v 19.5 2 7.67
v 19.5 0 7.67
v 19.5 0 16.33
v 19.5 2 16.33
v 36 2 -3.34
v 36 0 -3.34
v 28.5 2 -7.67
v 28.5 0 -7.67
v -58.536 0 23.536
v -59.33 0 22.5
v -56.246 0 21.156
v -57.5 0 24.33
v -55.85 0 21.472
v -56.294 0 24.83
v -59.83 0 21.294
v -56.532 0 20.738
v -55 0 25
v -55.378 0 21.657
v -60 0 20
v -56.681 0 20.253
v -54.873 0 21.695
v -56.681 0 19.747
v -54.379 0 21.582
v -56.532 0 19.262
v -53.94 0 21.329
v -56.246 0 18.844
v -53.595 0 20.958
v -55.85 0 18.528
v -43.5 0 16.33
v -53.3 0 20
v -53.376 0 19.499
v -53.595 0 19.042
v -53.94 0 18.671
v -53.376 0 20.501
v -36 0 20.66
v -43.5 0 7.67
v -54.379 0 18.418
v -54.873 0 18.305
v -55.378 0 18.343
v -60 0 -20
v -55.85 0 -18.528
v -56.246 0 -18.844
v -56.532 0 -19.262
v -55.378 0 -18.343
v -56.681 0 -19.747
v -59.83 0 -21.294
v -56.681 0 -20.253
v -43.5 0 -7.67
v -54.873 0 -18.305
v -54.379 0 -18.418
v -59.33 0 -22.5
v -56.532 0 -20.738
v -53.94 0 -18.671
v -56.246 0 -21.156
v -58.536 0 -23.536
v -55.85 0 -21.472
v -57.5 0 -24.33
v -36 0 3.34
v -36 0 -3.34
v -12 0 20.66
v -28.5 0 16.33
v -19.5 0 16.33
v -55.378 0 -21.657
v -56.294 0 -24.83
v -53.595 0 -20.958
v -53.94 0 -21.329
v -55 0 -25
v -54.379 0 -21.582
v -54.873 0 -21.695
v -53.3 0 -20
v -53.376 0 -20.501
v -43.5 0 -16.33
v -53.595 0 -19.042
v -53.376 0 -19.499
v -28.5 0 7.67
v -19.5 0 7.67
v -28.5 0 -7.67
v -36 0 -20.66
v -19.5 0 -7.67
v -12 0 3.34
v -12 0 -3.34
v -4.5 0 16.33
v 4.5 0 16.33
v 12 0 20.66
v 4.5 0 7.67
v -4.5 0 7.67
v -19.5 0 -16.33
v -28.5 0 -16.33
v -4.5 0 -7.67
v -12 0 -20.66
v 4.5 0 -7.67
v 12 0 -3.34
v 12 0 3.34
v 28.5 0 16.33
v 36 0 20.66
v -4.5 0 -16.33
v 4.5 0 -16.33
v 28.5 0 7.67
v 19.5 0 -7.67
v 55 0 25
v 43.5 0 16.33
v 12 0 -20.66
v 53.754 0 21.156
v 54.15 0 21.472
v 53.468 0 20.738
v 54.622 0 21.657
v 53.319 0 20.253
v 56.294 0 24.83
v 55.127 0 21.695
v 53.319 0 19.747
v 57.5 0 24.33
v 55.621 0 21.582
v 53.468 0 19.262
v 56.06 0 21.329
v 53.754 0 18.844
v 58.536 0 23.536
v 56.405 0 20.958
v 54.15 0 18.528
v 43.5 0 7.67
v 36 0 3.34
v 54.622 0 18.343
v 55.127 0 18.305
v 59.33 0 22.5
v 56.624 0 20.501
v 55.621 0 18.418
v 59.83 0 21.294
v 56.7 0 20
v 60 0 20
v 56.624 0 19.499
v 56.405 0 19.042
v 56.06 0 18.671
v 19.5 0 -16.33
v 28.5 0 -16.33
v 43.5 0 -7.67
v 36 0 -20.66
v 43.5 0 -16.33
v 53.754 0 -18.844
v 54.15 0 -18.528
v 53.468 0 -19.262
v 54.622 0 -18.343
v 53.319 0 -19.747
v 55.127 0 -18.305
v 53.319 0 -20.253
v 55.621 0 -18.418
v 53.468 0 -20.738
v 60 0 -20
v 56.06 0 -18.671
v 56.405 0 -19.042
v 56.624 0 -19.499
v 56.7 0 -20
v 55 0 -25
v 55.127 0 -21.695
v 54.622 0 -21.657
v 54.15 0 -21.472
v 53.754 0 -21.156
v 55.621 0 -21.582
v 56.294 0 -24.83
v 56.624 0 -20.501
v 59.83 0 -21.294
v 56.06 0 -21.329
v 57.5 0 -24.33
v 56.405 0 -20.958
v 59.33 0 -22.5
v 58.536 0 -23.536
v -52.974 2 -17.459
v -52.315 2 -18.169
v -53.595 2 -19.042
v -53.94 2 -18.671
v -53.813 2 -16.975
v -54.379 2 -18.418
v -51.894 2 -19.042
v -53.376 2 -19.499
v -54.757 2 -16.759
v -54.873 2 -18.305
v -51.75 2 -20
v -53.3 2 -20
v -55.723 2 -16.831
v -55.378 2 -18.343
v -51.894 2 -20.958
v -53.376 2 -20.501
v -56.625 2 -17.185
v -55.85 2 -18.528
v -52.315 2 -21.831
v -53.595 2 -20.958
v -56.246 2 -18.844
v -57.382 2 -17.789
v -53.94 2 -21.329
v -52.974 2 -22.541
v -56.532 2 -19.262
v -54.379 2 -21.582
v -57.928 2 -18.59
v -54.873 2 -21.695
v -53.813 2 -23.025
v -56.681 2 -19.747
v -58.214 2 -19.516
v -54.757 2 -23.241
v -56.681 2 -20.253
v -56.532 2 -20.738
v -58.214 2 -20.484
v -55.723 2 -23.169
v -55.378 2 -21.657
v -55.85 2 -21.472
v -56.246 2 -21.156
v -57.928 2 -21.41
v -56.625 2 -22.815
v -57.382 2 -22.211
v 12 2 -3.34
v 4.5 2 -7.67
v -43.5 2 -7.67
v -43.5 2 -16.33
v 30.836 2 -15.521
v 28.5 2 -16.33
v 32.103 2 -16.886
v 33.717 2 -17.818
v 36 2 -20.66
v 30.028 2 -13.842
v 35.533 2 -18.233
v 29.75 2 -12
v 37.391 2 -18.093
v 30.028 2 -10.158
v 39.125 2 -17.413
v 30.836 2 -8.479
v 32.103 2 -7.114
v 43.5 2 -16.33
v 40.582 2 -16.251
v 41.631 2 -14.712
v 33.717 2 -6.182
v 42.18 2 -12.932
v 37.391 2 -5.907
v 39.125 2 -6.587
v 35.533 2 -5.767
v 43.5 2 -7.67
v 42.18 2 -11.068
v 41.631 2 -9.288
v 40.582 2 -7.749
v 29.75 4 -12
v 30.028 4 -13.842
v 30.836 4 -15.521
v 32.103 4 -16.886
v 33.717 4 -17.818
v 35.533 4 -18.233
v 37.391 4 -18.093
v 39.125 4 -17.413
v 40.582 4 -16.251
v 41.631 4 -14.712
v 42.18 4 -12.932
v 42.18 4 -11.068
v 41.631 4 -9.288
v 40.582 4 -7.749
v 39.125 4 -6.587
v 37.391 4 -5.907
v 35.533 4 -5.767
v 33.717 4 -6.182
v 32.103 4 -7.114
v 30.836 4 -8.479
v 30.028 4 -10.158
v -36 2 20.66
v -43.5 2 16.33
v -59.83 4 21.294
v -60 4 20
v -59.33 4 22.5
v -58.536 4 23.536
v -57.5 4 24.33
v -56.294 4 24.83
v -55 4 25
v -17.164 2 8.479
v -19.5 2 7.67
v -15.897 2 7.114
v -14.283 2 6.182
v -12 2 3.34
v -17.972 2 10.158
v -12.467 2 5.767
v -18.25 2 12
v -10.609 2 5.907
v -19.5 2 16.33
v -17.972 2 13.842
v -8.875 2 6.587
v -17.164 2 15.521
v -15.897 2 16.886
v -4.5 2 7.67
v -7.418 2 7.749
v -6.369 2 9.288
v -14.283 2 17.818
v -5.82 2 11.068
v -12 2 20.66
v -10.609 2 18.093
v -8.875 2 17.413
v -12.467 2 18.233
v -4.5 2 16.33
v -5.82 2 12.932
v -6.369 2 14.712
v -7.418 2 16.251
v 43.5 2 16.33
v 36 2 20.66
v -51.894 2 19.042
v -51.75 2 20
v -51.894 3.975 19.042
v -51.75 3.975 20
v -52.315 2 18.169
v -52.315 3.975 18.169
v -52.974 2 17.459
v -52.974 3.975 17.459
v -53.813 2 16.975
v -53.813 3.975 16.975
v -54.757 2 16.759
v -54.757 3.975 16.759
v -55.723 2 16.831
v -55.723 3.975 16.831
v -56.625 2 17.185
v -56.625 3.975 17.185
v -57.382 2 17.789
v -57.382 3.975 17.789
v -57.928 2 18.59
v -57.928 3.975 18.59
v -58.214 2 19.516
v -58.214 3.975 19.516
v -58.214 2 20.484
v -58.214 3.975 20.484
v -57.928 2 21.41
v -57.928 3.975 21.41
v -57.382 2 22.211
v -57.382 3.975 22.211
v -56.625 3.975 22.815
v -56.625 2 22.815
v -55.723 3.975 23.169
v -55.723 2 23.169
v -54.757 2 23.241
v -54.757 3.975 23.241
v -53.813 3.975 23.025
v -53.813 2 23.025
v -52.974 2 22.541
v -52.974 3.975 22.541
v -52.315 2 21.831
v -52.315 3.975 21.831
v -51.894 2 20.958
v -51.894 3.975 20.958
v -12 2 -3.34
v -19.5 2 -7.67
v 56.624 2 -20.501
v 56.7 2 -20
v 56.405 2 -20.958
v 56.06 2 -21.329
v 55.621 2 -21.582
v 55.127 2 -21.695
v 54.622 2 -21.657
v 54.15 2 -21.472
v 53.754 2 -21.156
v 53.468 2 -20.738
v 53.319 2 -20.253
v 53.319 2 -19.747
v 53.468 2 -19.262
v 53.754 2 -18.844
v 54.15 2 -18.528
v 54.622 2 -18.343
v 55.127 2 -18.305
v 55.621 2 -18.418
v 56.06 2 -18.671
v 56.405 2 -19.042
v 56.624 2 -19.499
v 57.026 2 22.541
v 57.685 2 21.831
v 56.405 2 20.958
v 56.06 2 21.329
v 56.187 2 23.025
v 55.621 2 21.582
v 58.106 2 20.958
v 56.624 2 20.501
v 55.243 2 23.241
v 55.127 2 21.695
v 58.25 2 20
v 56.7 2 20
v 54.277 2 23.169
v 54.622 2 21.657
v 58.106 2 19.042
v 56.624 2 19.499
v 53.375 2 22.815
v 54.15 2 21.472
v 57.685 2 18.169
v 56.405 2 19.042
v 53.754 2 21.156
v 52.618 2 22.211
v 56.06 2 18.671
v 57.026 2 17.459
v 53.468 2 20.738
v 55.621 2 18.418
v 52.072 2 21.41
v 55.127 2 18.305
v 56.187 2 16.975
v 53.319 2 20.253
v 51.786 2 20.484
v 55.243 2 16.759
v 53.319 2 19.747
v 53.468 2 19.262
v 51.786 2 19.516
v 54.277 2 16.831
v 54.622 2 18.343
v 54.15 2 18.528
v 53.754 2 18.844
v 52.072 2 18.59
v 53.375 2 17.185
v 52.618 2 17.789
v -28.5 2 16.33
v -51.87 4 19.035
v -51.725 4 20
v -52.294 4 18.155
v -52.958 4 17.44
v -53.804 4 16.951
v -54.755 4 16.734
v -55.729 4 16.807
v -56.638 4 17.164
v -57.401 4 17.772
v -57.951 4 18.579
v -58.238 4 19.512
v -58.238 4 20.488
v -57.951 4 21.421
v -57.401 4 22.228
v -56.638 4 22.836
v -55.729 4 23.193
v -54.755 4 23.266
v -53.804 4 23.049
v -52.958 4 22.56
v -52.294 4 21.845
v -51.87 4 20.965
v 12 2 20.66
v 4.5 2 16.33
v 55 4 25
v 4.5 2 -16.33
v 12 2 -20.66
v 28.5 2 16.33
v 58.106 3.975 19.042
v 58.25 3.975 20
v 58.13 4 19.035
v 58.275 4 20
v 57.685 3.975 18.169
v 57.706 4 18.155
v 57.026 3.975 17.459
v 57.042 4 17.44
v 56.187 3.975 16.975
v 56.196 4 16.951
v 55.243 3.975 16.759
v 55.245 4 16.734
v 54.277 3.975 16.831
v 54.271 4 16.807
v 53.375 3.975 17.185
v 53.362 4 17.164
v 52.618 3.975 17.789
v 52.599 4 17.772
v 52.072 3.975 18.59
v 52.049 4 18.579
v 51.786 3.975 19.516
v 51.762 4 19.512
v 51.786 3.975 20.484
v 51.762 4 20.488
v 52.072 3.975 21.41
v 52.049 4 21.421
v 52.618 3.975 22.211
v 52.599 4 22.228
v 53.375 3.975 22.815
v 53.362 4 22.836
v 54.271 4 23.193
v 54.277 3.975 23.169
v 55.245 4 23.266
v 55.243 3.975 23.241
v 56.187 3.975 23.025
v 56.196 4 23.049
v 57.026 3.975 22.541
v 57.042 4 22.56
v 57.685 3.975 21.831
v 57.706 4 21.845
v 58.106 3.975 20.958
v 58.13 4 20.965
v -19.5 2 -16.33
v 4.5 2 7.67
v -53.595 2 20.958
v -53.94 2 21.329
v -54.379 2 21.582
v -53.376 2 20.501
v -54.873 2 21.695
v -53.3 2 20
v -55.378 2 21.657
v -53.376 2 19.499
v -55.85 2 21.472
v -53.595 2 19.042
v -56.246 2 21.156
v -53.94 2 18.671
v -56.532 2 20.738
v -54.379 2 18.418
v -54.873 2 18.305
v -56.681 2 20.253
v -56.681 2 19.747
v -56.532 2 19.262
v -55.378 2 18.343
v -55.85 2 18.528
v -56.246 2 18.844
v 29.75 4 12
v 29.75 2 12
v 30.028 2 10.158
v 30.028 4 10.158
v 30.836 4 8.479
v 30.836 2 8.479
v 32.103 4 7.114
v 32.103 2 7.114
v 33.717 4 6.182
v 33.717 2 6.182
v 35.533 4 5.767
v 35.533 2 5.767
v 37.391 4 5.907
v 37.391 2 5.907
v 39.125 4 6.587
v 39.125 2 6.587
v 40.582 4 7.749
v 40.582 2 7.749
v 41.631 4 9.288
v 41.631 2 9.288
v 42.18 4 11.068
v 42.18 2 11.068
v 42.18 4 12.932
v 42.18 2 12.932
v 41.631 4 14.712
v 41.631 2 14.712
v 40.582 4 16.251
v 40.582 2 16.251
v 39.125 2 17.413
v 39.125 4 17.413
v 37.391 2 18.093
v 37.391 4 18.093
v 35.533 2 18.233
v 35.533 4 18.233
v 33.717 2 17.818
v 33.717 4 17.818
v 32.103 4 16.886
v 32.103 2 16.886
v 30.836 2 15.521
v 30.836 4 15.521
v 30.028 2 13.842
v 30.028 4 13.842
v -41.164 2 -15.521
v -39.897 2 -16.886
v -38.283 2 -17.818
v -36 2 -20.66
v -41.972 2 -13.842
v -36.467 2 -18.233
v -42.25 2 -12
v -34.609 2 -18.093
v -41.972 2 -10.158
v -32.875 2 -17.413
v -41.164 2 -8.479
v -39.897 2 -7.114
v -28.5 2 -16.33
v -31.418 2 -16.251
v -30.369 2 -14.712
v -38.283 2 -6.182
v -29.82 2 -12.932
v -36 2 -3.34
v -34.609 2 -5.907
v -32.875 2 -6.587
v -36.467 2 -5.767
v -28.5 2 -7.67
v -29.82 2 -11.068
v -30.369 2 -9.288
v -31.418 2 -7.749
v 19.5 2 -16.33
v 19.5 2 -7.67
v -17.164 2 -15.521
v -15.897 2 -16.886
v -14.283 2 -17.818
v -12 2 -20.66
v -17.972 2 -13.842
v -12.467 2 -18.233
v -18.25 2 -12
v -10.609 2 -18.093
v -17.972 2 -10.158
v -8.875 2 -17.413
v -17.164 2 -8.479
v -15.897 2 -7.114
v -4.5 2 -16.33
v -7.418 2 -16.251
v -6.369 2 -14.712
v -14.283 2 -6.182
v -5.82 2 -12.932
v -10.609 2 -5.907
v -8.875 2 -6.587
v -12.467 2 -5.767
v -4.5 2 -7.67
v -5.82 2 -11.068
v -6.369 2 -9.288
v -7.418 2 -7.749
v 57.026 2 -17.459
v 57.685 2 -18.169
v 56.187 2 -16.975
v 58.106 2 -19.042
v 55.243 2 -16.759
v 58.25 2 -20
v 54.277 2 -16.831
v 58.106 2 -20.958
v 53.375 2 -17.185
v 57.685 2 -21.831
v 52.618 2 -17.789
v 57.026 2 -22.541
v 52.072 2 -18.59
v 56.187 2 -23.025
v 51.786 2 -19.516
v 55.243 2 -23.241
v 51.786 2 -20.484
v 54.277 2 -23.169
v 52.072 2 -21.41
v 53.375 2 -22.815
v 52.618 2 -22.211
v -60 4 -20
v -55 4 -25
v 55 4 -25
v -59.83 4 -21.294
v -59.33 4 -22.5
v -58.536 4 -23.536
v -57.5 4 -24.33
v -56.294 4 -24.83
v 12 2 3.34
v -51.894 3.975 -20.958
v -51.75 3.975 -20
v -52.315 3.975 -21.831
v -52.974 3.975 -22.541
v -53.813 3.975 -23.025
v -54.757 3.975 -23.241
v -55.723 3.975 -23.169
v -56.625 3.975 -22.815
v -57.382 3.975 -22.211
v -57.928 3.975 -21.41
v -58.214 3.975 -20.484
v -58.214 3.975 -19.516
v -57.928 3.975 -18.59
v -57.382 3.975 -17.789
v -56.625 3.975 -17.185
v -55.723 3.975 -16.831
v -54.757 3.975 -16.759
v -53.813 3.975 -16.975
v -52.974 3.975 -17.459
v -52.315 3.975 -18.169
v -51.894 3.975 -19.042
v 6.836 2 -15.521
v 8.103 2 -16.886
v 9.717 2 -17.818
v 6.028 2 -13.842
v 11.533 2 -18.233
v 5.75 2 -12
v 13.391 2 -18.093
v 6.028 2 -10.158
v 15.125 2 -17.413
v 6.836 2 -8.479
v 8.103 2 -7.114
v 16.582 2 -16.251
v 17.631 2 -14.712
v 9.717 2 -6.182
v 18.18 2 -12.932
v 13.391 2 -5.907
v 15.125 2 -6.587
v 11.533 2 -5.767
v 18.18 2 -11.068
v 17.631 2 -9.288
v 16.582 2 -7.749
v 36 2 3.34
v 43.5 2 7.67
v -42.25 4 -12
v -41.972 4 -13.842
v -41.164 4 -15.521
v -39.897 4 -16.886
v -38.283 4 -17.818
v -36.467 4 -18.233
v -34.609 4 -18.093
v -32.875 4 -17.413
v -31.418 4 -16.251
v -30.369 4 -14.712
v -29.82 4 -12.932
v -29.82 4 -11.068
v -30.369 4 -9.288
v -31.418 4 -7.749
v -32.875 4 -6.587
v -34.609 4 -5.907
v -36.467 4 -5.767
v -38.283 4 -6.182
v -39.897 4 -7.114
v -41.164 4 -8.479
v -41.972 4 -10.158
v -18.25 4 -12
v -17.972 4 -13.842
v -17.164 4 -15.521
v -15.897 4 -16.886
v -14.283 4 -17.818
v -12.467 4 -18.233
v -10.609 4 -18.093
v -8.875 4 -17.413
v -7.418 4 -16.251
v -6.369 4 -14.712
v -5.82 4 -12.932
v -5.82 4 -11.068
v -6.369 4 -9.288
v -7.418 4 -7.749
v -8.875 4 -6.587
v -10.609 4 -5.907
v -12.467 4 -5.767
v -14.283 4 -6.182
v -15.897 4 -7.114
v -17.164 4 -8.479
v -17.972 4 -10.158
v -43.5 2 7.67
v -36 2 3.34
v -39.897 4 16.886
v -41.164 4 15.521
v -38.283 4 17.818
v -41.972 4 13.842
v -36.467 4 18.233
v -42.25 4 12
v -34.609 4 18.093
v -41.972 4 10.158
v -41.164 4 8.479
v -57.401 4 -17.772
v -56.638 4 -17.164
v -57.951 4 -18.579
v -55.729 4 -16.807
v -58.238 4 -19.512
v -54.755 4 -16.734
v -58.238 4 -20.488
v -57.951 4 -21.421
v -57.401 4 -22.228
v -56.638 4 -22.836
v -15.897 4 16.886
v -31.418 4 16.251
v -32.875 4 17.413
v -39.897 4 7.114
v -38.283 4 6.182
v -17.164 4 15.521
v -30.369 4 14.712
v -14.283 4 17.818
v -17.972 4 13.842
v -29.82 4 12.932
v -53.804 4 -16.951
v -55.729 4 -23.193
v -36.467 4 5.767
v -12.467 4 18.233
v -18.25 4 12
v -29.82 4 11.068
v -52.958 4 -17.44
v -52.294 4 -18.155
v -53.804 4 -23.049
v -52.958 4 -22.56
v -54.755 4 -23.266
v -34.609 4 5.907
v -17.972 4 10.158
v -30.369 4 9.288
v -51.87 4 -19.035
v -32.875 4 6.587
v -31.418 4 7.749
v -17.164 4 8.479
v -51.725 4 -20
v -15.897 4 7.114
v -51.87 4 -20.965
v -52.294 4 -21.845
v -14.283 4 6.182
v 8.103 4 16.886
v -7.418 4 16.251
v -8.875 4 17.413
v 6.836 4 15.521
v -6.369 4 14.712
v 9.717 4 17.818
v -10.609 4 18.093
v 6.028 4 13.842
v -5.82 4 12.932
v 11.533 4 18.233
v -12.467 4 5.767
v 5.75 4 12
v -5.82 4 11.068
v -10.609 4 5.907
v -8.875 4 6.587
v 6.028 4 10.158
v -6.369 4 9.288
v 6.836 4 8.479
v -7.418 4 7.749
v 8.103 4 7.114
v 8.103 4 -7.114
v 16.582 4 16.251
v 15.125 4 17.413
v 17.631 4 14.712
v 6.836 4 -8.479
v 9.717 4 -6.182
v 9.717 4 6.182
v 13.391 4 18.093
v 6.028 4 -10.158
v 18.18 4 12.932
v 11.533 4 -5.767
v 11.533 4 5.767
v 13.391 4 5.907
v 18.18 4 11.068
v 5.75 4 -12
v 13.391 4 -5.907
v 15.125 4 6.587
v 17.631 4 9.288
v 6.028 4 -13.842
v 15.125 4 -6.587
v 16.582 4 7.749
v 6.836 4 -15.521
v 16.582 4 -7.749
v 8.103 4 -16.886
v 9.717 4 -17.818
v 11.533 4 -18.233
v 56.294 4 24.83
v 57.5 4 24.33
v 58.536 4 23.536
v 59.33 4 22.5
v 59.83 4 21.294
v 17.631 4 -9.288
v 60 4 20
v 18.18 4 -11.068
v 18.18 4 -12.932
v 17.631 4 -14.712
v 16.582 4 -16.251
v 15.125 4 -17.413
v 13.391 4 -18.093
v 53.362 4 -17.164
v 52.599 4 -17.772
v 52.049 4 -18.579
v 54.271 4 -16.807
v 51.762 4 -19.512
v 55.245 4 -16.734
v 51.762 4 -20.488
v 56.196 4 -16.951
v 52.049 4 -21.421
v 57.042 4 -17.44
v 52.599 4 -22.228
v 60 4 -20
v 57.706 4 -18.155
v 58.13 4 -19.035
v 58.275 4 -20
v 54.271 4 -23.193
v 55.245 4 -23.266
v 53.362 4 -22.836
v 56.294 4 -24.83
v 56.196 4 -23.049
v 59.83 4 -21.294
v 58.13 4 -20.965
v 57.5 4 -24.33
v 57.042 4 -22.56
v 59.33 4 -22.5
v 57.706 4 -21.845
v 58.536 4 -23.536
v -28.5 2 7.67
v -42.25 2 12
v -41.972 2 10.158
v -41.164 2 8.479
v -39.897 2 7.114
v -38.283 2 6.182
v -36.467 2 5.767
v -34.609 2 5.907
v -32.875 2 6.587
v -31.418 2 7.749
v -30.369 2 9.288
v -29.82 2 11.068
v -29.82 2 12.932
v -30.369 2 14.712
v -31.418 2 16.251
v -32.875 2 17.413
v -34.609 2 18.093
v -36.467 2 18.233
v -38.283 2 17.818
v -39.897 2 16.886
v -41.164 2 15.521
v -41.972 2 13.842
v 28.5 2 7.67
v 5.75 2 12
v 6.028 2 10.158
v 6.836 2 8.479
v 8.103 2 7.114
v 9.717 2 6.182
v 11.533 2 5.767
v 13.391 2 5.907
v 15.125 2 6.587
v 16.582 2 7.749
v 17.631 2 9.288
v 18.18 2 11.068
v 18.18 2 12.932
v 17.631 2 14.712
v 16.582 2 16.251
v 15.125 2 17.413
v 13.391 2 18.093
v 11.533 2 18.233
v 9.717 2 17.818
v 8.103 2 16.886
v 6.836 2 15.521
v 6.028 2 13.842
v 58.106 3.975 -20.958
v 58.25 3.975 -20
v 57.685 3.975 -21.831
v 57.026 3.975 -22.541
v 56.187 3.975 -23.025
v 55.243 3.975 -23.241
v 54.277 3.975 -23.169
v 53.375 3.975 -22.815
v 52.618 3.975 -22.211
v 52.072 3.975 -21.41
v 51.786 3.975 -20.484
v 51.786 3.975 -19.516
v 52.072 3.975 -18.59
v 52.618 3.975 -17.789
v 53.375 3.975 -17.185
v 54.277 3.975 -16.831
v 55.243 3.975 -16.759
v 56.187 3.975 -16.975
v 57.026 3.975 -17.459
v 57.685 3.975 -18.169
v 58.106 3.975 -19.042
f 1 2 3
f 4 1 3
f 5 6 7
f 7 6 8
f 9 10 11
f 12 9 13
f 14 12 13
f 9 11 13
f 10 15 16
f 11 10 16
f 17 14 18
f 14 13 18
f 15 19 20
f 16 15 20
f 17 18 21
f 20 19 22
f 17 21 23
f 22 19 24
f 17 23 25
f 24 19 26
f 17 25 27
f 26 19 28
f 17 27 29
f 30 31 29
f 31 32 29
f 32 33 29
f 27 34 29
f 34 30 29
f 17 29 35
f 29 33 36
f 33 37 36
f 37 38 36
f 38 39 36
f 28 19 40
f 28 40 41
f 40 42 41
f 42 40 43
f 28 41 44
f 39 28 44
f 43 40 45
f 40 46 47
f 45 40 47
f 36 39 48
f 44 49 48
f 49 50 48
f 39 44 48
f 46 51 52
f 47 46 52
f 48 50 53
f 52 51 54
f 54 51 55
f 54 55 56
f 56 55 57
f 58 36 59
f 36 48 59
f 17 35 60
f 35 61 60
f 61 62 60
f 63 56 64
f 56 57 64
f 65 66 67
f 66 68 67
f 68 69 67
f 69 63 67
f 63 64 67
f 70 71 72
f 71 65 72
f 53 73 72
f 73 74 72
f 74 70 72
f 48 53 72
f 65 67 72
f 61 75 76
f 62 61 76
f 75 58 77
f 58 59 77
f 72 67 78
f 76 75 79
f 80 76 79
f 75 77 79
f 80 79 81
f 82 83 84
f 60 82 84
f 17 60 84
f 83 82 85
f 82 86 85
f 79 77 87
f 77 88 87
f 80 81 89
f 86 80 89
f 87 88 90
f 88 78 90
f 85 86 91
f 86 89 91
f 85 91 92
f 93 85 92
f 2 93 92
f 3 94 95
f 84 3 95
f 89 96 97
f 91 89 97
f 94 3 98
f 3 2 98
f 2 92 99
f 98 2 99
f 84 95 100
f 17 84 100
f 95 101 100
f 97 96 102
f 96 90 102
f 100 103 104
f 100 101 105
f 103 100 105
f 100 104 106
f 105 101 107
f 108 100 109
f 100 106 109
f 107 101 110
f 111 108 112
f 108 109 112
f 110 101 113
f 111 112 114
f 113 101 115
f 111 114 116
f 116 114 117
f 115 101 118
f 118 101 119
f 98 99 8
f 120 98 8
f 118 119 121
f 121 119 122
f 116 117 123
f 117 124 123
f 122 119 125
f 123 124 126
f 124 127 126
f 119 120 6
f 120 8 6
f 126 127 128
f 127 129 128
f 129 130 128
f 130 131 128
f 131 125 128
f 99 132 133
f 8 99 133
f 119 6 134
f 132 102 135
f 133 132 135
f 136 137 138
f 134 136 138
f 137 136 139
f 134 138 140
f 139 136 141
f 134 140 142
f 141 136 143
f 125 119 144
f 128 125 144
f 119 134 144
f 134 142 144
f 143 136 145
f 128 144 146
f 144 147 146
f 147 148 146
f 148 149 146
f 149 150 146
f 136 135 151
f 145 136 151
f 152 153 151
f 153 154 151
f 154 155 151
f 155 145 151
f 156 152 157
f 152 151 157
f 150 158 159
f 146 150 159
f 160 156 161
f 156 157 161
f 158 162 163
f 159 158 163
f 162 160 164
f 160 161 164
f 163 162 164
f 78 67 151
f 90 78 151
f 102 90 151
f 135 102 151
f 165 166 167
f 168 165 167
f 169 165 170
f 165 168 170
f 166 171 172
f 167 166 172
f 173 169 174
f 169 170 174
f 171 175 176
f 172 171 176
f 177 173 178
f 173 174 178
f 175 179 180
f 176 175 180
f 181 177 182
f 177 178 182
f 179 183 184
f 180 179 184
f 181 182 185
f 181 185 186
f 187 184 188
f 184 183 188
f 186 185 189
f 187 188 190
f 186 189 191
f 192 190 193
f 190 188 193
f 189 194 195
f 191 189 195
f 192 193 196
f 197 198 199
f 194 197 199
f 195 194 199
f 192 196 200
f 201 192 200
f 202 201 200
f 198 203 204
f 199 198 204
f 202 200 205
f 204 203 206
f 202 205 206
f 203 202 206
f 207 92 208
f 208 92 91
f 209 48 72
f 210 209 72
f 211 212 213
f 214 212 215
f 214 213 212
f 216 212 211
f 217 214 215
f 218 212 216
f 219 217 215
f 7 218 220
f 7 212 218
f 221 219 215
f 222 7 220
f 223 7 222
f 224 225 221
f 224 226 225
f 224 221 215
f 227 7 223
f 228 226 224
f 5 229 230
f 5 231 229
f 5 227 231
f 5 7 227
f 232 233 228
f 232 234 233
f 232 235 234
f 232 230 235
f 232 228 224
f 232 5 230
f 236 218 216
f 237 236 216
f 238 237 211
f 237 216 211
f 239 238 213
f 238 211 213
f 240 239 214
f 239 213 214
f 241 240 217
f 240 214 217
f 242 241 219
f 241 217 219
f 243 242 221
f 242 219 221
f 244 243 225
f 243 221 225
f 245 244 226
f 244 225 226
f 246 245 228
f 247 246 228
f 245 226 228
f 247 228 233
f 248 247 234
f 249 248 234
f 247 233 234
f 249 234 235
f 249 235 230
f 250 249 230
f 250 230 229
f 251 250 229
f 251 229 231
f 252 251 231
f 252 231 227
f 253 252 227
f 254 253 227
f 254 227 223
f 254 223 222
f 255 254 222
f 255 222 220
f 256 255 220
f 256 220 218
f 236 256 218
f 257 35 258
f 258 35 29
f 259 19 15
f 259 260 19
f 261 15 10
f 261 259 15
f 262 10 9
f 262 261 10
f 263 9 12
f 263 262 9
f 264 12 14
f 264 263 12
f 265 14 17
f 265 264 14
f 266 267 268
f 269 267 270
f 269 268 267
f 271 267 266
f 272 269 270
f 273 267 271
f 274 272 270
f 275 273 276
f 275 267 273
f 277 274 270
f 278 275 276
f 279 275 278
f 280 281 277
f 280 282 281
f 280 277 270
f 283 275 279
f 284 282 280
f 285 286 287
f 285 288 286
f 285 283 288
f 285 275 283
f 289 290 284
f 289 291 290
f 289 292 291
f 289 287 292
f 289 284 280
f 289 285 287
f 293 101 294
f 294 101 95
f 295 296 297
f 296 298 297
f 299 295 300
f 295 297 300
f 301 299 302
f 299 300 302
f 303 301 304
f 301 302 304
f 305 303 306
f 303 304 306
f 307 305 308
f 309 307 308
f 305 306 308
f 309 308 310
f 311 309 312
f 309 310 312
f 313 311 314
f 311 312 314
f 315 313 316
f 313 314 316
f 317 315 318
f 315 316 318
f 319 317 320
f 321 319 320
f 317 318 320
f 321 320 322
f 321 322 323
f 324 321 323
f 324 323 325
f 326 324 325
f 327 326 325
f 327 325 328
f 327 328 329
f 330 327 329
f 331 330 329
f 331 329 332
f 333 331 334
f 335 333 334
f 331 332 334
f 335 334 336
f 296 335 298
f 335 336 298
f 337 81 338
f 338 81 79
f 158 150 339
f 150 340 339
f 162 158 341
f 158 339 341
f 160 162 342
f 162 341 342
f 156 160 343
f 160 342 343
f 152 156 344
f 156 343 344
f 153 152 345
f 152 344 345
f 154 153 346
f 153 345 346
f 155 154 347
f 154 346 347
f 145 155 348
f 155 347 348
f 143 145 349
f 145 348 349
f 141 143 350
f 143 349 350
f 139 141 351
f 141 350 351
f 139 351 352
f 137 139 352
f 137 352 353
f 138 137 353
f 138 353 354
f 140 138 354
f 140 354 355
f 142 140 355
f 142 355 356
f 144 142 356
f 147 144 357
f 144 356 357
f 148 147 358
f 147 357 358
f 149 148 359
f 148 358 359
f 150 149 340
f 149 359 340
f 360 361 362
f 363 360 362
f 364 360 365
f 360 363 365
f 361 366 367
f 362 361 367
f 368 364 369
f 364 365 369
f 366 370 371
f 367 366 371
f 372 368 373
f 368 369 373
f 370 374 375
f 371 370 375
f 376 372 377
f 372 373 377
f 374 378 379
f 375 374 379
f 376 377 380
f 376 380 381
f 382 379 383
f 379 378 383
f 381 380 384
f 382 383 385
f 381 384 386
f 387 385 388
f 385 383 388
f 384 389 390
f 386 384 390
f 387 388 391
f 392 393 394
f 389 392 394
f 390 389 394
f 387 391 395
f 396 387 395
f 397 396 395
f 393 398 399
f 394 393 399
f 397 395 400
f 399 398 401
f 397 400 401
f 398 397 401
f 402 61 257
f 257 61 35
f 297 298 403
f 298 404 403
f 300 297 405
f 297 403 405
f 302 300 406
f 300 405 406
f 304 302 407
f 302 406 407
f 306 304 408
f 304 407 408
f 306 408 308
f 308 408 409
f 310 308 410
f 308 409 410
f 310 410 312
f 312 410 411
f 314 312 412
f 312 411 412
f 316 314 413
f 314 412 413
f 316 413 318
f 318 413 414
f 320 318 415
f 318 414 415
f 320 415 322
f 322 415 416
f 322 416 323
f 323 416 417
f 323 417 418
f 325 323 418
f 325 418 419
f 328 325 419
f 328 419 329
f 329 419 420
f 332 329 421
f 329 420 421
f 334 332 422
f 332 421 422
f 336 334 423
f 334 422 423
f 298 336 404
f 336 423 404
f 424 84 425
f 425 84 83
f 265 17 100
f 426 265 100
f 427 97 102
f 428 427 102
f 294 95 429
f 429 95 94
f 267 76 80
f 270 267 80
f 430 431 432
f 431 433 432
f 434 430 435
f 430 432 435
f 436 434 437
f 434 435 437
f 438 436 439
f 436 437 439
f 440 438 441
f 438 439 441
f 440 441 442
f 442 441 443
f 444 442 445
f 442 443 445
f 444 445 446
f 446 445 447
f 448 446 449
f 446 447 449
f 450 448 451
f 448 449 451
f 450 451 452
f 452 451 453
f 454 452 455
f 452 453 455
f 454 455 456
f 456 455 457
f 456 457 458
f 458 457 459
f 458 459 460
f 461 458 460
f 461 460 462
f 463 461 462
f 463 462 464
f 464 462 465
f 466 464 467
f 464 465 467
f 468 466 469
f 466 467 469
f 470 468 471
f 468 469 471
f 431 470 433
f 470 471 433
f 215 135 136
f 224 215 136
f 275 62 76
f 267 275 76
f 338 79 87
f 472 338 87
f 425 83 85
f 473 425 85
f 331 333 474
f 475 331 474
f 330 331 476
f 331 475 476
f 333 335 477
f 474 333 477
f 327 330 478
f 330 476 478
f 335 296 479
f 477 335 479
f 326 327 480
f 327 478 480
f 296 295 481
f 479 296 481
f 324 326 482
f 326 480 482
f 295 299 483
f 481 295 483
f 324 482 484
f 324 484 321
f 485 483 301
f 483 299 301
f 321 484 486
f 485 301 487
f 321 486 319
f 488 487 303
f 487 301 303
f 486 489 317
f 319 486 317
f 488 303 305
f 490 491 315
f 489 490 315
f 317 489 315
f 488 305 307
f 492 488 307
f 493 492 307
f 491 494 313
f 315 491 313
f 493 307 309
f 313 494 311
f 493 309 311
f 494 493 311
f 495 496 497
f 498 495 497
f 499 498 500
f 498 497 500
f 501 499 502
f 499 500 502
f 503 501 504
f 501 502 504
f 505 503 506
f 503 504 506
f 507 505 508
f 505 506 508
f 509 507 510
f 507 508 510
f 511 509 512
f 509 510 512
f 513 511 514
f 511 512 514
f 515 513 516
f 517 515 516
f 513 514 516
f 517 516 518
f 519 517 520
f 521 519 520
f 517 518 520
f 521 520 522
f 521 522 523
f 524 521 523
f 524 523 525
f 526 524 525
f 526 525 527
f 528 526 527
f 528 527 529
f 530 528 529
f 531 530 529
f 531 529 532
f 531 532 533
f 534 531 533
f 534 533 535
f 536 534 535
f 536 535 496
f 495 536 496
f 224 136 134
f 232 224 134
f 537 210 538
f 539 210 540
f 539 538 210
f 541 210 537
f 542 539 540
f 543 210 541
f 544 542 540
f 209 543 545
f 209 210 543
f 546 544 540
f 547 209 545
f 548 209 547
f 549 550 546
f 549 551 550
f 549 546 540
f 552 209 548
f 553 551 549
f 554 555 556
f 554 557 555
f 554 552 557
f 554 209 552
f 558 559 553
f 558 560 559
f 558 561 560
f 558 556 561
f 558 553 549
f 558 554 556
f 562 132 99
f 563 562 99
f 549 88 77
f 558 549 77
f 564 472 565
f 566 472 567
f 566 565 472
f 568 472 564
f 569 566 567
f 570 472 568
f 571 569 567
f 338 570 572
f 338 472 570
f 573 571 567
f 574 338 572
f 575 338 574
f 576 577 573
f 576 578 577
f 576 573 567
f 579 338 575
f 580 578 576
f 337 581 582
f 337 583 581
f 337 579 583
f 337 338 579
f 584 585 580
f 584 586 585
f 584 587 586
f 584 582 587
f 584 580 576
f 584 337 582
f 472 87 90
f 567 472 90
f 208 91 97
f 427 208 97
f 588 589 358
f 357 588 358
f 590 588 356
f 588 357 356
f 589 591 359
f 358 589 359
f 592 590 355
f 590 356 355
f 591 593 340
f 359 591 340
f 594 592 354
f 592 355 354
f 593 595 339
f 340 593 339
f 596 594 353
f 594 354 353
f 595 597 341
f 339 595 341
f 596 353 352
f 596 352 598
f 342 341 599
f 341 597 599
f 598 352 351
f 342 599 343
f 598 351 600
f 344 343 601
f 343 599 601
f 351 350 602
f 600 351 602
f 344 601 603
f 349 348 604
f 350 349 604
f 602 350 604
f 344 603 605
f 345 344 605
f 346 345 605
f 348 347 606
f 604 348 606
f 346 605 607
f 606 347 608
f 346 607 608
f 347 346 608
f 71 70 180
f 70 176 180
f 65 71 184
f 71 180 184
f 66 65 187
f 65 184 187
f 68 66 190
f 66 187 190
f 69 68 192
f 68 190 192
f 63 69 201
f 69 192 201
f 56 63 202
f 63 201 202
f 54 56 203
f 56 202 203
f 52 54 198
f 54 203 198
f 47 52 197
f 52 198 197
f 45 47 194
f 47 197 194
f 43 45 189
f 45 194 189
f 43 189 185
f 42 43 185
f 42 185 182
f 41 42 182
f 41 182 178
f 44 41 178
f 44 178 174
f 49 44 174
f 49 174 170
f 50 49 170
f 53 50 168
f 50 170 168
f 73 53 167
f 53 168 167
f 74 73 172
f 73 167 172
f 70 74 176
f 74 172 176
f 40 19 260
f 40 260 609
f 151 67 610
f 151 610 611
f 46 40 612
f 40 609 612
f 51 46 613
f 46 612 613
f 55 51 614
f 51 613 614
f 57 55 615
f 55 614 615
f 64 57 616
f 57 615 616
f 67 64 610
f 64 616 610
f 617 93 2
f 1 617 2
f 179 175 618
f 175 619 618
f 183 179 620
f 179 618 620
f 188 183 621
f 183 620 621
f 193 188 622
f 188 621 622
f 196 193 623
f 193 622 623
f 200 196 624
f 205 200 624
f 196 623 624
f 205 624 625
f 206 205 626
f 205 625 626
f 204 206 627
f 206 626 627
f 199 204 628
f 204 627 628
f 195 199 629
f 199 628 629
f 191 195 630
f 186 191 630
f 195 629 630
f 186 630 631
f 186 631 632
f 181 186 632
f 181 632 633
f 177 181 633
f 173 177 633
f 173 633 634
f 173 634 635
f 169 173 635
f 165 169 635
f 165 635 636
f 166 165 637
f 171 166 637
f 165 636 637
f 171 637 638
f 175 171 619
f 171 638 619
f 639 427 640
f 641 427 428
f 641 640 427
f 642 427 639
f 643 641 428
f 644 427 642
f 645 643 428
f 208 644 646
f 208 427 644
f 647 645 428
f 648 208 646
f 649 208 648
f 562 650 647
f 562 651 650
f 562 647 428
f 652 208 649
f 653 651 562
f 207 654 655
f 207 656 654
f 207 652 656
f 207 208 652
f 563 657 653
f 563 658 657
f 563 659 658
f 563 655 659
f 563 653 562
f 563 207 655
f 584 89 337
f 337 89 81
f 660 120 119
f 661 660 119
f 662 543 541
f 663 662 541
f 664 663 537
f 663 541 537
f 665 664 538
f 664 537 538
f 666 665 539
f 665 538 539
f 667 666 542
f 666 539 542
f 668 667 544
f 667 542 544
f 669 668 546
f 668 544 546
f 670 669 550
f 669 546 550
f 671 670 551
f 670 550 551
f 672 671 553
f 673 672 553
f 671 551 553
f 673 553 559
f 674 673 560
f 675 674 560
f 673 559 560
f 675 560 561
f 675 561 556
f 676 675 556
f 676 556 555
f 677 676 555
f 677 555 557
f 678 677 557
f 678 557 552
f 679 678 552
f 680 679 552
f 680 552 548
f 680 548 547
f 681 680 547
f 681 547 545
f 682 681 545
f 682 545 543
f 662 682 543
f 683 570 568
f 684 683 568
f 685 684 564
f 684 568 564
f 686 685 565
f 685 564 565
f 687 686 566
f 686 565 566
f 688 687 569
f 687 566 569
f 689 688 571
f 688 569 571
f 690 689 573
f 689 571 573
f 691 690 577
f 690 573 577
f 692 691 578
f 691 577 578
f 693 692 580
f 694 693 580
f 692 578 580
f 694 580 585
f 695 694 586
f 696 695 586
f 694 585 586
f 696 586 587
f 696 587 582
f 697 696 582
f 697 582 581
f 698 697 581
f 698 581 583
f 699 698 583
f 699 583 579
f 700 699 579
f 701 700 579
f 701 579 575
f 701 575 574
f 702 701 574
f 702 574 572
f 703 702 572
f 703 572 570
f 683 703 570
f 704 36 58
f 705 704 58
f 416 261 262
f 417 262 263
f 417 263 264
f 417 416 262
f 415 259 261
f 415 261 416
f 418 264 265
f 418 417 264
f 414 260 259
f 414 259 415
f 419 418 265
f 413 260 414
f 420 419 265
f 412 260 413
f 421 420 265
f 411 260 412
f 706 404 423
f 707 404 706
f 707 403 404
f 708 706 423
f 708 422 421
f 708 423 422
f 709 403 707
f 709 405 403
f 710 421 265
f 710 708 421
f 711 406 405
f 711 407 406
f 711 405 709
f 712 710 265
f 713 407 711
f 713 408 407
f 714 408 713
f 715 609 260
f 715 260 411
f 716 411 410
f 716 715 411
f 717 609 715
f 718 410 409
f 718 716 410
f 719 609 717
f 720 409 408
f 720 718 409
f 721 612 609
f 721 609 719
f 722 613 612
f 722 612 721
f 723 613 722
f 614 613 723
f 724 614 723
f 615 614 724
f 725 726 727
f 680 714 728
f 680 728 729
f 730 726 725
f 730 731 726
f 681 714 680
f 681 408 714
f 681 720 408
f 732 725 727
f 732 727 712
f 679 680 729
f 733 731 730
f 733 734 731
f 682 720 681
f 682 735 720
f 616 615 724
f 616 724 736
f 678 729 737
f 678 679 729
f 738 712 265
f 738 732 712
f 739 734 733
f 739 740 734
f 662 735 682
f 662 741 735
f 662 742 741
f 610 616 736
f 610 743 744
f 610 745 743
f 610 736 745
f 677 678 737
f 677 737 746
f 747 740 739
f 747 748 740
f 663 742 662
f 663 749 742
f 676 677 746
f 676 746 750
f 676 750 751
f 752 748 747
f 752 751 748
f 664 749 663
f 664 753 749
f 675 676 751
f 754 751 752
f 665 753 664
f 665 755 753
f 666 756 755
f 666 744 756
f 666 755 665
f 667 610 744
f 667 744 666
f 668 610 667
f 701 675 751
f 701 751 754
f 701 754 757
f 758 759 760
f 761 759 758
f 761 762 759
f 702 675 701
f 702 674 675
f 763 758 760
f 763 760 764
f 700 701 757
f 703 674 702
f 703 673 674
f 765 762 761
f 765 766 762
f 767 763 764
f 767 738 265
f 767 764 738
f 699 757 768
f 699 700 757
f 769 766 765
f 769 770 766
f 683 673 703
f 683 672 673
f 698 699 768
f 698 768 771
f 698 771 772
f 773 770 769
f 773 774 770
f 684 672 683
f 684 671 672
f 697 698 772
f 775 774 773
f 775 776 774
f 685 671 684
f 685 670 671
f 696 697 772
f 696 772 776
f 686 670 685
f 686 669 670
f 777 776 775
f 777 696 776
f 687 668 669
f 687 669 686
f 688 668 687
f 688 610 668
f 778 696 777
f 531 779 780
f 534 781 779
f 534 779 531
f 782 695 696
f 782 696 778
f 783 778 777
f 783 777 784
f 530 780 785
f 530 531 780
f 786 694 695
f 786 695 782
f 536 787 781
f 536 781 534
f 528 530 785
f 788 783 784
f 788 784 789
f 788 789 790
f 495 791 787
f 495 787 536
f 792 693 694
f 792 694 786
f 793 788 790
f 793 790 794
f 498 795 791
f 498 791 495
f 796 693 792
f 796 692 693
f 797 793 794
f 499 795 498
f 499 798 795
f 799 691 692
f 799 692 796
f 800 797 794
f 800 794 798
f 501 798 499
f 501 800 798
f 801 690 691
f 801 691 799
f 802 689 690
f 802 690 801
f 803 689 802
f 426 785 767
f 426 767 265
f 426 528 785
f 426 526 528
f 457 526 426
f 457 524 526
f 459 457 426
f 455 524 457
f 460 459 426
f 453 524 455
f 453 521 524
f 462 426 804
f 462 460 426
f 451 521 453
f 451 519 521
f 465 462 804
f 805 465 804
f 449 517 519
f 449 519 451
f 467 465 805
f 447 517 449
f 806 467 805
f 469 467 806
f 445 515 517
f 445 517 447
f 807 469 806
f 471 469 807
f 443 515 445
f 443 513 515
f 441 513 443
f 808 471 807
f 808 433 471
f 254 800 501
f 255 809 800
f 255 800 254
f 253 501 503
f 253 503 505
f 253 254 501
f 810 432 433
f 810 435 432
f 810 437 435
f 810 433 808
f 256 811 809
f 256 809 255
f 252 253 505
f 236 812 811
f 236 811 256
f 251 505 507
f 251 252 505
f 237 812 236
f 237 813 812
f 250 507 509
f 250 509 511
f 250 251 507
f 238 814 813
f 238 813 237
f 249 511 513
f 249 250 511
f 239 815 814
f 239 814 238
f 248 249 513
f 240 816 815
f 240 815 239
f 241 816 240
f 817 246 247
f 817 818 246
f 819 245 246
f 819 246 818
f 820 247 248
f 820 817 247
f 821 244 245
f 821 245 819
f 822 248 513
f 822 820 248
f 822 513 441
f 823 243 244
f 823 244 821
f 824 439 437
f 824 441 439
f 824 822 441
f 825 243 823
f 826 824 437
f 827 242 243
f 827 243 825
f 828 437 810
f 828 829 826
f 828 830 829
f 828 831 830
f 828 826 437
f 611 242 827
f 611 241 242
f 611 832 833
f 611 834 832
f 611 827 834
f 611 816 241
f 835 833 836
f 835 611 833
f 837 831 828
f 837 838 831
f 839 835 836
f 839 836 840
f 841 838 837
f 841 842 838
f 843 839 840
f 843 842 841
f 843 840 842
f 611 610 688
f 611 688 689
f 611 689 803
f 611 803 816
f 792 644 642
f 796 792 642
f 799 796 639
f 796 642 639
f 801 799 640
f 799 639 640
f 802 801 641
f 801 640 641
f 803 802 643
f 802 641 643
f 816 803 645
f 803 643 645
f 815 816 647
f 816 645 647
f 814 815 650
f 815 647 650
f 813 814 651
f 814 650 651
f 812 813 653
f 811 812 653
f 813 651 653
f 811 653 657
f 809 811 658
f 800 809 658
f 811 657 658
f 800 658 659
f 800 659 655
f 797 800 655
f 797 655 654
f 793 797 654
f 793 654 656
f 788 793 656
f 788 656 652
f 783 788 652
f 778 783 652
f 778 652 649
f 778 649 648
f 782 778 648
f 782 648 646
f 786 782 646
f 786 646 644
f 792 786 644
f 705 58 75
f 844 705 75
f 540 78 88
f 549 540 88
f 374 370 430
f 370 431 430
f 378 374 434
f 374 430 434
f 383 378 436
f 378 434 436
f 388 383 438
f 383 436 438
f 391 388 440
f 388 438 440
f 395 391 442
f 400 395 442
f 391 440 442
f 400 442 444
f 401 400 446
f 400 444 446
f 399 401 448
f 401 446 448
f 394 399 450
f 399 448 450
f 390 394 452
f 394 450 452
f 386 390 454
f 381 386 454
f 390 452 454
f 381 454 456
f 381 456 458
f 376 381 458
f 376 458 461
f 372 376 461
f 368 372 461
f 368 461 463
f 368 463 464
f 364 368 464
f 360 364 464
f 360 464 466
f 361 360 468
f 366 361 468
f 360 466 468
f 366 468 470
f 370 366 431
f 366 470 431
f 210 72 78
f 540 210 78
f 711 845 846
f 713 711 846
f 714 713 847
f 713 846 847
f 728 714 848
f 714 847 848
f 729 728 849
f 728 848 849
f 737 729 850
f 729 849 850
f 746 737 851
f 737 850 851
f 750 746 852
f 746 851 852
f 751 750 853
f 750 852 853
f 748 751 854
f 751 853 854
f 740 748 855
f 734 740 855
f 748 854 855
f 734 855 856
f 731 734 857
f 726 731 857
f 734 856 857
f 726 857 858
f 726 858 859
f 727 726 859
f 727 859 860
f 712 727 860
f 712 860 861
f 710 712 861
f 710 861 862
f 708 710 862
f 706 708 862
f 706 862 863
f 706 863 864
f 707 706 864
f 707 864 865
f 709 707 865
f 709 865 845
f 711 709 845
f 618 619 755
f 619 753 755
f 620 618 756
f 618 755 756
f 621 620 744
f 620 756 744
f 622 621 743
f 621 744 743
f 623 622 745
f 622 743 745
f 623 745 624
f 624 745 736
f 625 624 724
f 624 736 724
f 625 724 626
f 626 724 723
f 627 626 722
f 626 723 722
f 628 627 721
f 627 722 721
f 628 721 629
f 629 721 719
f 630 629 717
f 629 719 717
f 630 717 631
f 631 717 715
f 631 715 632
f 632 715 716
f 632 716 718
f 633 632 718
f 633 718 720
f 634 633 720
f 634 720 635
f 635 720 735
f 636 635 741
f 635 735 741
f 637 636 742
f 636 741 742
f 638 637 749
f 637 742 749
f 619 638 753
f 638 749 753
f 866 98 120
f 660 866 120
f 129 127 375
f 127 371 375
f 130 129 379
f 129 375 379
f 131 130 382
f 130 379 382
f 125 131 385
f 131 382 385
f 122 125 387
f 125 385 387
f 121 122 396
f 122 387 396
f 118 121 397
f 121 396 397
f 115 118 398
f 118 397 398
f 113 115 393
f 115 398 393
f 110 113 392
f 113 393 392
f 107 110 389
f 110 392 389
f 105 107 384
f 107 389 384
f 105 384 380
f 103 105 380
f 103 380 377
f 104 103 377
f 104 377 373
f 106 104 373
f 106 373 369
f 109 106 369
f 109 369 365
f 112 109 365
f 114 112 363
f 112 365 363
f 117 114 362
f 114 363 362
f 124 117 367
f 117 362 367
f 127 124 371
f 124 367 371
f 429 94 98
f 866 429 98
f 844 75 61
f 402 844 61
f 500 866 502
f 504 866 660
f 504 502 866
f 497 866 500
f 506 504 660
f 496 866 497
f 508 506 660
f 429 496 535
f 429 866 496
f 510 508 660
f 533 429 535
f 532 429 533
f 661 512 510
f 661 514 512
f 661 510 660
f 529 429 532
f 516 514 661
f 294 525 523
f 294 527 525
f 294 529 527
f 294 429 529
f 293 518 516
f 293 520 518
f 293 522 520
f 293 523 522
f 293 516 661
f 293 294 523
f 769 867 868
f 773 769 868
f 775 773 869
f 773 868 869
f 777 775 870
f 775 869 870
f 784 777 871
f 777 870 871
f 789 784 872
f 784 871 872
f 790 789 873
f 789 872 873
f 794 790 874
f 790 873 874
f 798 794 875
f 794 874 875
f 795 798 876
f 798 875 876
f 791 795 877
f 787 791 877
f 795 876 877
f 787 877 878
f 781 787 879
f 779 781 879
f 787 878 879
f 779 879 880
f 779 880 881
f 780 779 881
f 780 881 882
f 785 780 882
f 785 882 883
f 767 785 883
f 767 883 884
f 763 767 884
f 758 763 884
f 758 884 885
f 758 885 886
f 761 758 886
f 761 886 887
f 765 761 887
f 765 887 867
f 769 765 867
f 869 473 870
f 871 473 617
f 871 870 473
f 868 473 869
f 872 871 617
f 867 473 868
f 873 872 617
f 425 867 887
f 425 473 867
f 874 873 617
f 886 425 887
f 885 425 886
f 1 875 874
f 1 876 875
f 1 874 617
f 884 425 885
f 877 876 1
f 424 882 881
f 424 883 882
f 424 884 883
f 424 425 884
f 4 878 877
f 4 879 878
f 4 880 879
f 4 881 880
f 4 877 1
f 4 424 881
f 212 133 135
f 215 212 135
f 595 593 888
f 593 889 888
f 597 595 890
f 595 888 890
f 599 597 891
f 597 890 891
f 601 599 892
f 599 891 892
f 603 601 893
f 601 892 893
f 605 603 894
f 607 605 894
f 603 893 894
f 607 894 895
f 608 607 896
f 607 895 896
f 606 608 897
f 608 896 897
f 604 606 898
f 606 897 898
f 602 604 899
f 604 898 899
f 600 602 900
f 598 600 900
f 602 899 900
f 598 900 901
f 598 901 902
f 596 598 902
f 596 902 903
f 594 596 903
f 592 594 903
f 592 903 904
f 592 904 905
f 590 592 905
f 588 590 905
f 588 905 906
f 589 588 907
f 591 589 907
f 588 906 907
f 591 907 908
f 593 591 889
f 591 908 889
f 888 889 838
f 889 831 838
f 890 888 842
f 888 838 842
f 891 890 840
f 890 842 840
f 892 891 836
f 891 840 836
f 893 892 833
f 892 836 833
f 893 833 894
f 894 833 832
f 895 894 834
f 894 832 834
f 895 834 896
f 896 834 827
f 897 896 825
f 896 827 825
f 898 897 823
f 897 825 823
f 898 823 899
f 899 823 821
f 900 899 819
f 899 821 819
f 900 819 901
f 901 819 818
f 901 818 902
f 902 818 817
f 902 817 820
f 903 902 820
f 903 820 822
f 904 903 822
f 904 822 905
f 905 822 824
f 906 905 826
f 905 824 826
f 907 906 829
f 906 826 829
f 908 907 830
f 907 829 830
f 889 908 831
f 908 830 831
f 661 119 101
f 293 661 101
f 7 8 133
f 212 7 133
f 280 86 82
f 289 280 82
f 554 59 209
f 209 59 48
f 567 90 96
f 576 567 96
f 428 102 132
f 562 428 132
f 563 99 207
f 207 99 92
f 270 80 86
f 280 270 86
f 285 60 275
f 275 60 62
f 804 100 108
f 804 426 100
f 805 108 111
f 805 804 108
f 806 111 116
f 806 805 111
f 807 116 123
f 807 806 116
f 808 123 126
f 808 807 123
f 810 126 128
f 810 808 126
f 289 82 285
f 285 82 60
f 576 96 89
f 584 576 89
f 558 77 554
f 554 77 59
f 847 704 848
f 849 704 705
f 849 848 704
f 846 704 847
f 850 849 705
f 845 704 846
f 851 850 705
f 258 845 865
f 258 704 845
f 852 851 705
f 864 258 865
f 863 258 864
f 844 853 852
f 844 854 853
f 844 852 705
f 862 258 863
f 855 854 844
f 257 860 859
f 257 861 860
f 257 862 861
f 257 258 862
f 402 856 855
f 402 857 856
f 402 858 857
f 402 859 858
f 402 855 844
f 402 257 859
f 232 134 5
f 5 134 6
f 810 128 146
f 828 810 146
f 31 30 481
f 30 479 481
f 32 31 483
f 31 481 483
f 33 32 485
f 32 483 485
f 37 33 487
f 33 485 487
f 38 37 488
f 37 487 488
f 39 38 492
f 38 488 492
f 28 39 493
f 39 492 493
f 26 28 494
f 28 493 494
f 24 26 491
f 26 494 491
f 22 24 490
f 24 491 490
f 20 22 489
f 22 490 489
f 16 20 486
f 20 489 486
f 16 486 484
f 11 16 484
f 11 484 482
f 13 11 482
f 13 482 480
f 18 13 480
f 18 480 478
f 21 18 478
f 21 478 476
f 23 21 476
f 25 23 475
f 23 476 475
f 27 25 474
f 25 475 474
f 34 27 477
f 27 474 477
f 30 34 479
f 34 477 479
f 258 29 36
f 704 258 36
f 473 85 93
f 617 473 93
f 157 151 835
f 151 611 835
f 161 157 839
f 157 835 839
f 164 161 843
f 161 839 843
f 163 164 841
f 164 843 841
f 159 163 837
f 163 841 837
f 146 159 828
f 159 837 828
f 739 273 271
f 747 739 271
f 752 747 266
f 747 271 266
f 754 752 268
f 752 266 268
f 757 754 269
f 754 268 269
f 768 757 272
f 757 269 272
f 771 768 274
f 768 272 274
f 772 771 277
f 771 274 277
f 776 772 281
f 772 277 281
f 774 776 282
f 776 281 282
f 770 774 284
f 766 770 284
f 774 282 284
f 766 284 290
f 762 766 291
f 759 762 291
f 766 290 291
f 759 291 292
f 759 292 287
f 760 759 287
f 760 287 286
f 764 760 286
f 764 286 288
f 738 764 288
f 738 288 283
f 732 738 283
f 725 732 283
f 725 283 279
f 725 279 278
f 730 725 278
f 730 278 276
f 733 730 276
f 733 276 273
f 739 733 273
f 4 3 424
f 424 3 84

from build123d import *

# Parameters (mm, degrees)
SKETCH1_W               = 120
SKETCH1_H               = 50
BODY_DEPTH              = 4
EDGE_FILLETS_R          = 5
GX12_HOLE_D             = 12.5
GX12_NUT_CUT_DEPTH      = 2
GX12_PATTERN_COUNT      = 4
GX12_PATTERN_PITCH      = 24
GX12_PATTERN_COUNT_DIR2 = 2
GX12_PATTERN_PITCH_DIR2 = 24


# Read off the part's stored shape, not the designer's step: mounting_holes
with BuildPart() as part:
    # Sketch1 → body (new body)
    with BuildSketch(Plane(origin=(0, 0, 0), x_dir=(1, 0, 0), z_dir=(0, 1, 0))):
        Rectangle(SKETCH1_W, SKETCH1_H)
    extrude(amount=BODY_DEPTH)

    # mounting_holes outline → mounting_holes (revolve, cut)
    with BuildSketch(Plane(origin=(55, 0, 20), x_dir=(1, 0, 0), z_dir=(0, 0, 1))):
        Polygon((0, 0), (1.7, 0), (1.7, 2), (3.25, 2), (3.25, 3.975), (3.275, 4), (0, 4), align=None)
    revolve(axis=Axis((55, 0, 20), (0, 1, 0)), mode=Mode.SUBTRACT)

    # mounting_holes 2 outline → mounting_holes 2 (revolve, cut)
    with BuildSketch(Plane(origin=(-55, 0, -20), x_dir=(1, 0, 0), z_dir=(0, 0, 1))):
        Polygon((0, 4), (0, 0), (1.7, 0), (1.7, 2), (3.25, 2), (3.25, 3.975), (3.275, 4), align=None)
    revolve(axis=Axis((-55, 0, -20), (0, 1, 0)), mode=Mode.SUBTRACT)

    # mounting_holes 3 outline → mounting_holes 3 (revolve, cut)
    with BuildSketch(Plane(origin=(55, 0, -20), x_dir=(1, 0, 0), z_dir=(0, 0, 1))):
        Polygon((0, 4), (0, 0), (1.7, 0), (1.7, 2), (3.25, 2), (3.25, 3.975), (3.275, 4), align=None)
    revolve(axis=Axis((55, 0, -20), (0, 1, 0)), mode=Mode.SUBTRACT)

    # mounting_holes 4 outline → mounting_holes 4 (revolve, cut)
    with BuildSketch(Plane(origin=(-55, 0, 20), x_dir=(1, 0, 0), z_dir=(0, 0, 1))):
        Polygon((0, 4), (0, 0), (1.7, 0), (1.7, 2), (3.25, 2), (3.25, 3.975), (3.275, 4), align=None)
    revolve(axis=Axis((-55, 0, 20), (0, 1, 0)), mode=Mode.SUBTRACT)

    # edge_fillets
    edge_fillets_edges = [part.edges().sort_by_distance(p)[0] for p in [
        (60, 2, 25),
        (-60, 2, 25),
        (-60, 2, -25),
        (60, 2, -25),
    ]]
    fillet(edge_fillets_edges, radius=EDGE_FILLETS_R)

    # gx12_hole (through all)
    with Locations(Plane(origin=(0, 4, 0), x_dir=(1, 0, 0), z_dir=(0, 1, 0))):
        with Locations((-36, 12)):
            gx12_hole = Hole(GX12_HOLE_D / 2)

    # Sketch6 → gx12_nut_cut (cut)
    with BuildSketch(Plane.XZ):
        Polygon((-36, -3.339745962), (-43.5, -7.669872981), (-43.5, -16.330127019), (-36, -20.660254038), (-28.5, -16.330127019), (-28.5, -7.669872981), align=None)
    gx12_nut_cut = extrude(amount=-GX12_NUT_CUT_DEPTH, mode=Mode.SUBTRACT)

    # gx12_pattern: gx12_hole, gx12_nut_cut 4 × 2
    with Locations(*[(i * GX12_PATTERN_PITCH, 0, j * GX12_PATTERN_PITCH_DIR2) for i in range(GX12_PATTERN_COUNT) for j in range(GX12_PATTERN_COUNT_DIR2) if (i, j) != (0, 0)]):
        add(gx12_hole, mode=Mode.SUBTRACT)
        add(gx12_nut_cut, mode=Mode.SUBTRACT)


solid = part.part
